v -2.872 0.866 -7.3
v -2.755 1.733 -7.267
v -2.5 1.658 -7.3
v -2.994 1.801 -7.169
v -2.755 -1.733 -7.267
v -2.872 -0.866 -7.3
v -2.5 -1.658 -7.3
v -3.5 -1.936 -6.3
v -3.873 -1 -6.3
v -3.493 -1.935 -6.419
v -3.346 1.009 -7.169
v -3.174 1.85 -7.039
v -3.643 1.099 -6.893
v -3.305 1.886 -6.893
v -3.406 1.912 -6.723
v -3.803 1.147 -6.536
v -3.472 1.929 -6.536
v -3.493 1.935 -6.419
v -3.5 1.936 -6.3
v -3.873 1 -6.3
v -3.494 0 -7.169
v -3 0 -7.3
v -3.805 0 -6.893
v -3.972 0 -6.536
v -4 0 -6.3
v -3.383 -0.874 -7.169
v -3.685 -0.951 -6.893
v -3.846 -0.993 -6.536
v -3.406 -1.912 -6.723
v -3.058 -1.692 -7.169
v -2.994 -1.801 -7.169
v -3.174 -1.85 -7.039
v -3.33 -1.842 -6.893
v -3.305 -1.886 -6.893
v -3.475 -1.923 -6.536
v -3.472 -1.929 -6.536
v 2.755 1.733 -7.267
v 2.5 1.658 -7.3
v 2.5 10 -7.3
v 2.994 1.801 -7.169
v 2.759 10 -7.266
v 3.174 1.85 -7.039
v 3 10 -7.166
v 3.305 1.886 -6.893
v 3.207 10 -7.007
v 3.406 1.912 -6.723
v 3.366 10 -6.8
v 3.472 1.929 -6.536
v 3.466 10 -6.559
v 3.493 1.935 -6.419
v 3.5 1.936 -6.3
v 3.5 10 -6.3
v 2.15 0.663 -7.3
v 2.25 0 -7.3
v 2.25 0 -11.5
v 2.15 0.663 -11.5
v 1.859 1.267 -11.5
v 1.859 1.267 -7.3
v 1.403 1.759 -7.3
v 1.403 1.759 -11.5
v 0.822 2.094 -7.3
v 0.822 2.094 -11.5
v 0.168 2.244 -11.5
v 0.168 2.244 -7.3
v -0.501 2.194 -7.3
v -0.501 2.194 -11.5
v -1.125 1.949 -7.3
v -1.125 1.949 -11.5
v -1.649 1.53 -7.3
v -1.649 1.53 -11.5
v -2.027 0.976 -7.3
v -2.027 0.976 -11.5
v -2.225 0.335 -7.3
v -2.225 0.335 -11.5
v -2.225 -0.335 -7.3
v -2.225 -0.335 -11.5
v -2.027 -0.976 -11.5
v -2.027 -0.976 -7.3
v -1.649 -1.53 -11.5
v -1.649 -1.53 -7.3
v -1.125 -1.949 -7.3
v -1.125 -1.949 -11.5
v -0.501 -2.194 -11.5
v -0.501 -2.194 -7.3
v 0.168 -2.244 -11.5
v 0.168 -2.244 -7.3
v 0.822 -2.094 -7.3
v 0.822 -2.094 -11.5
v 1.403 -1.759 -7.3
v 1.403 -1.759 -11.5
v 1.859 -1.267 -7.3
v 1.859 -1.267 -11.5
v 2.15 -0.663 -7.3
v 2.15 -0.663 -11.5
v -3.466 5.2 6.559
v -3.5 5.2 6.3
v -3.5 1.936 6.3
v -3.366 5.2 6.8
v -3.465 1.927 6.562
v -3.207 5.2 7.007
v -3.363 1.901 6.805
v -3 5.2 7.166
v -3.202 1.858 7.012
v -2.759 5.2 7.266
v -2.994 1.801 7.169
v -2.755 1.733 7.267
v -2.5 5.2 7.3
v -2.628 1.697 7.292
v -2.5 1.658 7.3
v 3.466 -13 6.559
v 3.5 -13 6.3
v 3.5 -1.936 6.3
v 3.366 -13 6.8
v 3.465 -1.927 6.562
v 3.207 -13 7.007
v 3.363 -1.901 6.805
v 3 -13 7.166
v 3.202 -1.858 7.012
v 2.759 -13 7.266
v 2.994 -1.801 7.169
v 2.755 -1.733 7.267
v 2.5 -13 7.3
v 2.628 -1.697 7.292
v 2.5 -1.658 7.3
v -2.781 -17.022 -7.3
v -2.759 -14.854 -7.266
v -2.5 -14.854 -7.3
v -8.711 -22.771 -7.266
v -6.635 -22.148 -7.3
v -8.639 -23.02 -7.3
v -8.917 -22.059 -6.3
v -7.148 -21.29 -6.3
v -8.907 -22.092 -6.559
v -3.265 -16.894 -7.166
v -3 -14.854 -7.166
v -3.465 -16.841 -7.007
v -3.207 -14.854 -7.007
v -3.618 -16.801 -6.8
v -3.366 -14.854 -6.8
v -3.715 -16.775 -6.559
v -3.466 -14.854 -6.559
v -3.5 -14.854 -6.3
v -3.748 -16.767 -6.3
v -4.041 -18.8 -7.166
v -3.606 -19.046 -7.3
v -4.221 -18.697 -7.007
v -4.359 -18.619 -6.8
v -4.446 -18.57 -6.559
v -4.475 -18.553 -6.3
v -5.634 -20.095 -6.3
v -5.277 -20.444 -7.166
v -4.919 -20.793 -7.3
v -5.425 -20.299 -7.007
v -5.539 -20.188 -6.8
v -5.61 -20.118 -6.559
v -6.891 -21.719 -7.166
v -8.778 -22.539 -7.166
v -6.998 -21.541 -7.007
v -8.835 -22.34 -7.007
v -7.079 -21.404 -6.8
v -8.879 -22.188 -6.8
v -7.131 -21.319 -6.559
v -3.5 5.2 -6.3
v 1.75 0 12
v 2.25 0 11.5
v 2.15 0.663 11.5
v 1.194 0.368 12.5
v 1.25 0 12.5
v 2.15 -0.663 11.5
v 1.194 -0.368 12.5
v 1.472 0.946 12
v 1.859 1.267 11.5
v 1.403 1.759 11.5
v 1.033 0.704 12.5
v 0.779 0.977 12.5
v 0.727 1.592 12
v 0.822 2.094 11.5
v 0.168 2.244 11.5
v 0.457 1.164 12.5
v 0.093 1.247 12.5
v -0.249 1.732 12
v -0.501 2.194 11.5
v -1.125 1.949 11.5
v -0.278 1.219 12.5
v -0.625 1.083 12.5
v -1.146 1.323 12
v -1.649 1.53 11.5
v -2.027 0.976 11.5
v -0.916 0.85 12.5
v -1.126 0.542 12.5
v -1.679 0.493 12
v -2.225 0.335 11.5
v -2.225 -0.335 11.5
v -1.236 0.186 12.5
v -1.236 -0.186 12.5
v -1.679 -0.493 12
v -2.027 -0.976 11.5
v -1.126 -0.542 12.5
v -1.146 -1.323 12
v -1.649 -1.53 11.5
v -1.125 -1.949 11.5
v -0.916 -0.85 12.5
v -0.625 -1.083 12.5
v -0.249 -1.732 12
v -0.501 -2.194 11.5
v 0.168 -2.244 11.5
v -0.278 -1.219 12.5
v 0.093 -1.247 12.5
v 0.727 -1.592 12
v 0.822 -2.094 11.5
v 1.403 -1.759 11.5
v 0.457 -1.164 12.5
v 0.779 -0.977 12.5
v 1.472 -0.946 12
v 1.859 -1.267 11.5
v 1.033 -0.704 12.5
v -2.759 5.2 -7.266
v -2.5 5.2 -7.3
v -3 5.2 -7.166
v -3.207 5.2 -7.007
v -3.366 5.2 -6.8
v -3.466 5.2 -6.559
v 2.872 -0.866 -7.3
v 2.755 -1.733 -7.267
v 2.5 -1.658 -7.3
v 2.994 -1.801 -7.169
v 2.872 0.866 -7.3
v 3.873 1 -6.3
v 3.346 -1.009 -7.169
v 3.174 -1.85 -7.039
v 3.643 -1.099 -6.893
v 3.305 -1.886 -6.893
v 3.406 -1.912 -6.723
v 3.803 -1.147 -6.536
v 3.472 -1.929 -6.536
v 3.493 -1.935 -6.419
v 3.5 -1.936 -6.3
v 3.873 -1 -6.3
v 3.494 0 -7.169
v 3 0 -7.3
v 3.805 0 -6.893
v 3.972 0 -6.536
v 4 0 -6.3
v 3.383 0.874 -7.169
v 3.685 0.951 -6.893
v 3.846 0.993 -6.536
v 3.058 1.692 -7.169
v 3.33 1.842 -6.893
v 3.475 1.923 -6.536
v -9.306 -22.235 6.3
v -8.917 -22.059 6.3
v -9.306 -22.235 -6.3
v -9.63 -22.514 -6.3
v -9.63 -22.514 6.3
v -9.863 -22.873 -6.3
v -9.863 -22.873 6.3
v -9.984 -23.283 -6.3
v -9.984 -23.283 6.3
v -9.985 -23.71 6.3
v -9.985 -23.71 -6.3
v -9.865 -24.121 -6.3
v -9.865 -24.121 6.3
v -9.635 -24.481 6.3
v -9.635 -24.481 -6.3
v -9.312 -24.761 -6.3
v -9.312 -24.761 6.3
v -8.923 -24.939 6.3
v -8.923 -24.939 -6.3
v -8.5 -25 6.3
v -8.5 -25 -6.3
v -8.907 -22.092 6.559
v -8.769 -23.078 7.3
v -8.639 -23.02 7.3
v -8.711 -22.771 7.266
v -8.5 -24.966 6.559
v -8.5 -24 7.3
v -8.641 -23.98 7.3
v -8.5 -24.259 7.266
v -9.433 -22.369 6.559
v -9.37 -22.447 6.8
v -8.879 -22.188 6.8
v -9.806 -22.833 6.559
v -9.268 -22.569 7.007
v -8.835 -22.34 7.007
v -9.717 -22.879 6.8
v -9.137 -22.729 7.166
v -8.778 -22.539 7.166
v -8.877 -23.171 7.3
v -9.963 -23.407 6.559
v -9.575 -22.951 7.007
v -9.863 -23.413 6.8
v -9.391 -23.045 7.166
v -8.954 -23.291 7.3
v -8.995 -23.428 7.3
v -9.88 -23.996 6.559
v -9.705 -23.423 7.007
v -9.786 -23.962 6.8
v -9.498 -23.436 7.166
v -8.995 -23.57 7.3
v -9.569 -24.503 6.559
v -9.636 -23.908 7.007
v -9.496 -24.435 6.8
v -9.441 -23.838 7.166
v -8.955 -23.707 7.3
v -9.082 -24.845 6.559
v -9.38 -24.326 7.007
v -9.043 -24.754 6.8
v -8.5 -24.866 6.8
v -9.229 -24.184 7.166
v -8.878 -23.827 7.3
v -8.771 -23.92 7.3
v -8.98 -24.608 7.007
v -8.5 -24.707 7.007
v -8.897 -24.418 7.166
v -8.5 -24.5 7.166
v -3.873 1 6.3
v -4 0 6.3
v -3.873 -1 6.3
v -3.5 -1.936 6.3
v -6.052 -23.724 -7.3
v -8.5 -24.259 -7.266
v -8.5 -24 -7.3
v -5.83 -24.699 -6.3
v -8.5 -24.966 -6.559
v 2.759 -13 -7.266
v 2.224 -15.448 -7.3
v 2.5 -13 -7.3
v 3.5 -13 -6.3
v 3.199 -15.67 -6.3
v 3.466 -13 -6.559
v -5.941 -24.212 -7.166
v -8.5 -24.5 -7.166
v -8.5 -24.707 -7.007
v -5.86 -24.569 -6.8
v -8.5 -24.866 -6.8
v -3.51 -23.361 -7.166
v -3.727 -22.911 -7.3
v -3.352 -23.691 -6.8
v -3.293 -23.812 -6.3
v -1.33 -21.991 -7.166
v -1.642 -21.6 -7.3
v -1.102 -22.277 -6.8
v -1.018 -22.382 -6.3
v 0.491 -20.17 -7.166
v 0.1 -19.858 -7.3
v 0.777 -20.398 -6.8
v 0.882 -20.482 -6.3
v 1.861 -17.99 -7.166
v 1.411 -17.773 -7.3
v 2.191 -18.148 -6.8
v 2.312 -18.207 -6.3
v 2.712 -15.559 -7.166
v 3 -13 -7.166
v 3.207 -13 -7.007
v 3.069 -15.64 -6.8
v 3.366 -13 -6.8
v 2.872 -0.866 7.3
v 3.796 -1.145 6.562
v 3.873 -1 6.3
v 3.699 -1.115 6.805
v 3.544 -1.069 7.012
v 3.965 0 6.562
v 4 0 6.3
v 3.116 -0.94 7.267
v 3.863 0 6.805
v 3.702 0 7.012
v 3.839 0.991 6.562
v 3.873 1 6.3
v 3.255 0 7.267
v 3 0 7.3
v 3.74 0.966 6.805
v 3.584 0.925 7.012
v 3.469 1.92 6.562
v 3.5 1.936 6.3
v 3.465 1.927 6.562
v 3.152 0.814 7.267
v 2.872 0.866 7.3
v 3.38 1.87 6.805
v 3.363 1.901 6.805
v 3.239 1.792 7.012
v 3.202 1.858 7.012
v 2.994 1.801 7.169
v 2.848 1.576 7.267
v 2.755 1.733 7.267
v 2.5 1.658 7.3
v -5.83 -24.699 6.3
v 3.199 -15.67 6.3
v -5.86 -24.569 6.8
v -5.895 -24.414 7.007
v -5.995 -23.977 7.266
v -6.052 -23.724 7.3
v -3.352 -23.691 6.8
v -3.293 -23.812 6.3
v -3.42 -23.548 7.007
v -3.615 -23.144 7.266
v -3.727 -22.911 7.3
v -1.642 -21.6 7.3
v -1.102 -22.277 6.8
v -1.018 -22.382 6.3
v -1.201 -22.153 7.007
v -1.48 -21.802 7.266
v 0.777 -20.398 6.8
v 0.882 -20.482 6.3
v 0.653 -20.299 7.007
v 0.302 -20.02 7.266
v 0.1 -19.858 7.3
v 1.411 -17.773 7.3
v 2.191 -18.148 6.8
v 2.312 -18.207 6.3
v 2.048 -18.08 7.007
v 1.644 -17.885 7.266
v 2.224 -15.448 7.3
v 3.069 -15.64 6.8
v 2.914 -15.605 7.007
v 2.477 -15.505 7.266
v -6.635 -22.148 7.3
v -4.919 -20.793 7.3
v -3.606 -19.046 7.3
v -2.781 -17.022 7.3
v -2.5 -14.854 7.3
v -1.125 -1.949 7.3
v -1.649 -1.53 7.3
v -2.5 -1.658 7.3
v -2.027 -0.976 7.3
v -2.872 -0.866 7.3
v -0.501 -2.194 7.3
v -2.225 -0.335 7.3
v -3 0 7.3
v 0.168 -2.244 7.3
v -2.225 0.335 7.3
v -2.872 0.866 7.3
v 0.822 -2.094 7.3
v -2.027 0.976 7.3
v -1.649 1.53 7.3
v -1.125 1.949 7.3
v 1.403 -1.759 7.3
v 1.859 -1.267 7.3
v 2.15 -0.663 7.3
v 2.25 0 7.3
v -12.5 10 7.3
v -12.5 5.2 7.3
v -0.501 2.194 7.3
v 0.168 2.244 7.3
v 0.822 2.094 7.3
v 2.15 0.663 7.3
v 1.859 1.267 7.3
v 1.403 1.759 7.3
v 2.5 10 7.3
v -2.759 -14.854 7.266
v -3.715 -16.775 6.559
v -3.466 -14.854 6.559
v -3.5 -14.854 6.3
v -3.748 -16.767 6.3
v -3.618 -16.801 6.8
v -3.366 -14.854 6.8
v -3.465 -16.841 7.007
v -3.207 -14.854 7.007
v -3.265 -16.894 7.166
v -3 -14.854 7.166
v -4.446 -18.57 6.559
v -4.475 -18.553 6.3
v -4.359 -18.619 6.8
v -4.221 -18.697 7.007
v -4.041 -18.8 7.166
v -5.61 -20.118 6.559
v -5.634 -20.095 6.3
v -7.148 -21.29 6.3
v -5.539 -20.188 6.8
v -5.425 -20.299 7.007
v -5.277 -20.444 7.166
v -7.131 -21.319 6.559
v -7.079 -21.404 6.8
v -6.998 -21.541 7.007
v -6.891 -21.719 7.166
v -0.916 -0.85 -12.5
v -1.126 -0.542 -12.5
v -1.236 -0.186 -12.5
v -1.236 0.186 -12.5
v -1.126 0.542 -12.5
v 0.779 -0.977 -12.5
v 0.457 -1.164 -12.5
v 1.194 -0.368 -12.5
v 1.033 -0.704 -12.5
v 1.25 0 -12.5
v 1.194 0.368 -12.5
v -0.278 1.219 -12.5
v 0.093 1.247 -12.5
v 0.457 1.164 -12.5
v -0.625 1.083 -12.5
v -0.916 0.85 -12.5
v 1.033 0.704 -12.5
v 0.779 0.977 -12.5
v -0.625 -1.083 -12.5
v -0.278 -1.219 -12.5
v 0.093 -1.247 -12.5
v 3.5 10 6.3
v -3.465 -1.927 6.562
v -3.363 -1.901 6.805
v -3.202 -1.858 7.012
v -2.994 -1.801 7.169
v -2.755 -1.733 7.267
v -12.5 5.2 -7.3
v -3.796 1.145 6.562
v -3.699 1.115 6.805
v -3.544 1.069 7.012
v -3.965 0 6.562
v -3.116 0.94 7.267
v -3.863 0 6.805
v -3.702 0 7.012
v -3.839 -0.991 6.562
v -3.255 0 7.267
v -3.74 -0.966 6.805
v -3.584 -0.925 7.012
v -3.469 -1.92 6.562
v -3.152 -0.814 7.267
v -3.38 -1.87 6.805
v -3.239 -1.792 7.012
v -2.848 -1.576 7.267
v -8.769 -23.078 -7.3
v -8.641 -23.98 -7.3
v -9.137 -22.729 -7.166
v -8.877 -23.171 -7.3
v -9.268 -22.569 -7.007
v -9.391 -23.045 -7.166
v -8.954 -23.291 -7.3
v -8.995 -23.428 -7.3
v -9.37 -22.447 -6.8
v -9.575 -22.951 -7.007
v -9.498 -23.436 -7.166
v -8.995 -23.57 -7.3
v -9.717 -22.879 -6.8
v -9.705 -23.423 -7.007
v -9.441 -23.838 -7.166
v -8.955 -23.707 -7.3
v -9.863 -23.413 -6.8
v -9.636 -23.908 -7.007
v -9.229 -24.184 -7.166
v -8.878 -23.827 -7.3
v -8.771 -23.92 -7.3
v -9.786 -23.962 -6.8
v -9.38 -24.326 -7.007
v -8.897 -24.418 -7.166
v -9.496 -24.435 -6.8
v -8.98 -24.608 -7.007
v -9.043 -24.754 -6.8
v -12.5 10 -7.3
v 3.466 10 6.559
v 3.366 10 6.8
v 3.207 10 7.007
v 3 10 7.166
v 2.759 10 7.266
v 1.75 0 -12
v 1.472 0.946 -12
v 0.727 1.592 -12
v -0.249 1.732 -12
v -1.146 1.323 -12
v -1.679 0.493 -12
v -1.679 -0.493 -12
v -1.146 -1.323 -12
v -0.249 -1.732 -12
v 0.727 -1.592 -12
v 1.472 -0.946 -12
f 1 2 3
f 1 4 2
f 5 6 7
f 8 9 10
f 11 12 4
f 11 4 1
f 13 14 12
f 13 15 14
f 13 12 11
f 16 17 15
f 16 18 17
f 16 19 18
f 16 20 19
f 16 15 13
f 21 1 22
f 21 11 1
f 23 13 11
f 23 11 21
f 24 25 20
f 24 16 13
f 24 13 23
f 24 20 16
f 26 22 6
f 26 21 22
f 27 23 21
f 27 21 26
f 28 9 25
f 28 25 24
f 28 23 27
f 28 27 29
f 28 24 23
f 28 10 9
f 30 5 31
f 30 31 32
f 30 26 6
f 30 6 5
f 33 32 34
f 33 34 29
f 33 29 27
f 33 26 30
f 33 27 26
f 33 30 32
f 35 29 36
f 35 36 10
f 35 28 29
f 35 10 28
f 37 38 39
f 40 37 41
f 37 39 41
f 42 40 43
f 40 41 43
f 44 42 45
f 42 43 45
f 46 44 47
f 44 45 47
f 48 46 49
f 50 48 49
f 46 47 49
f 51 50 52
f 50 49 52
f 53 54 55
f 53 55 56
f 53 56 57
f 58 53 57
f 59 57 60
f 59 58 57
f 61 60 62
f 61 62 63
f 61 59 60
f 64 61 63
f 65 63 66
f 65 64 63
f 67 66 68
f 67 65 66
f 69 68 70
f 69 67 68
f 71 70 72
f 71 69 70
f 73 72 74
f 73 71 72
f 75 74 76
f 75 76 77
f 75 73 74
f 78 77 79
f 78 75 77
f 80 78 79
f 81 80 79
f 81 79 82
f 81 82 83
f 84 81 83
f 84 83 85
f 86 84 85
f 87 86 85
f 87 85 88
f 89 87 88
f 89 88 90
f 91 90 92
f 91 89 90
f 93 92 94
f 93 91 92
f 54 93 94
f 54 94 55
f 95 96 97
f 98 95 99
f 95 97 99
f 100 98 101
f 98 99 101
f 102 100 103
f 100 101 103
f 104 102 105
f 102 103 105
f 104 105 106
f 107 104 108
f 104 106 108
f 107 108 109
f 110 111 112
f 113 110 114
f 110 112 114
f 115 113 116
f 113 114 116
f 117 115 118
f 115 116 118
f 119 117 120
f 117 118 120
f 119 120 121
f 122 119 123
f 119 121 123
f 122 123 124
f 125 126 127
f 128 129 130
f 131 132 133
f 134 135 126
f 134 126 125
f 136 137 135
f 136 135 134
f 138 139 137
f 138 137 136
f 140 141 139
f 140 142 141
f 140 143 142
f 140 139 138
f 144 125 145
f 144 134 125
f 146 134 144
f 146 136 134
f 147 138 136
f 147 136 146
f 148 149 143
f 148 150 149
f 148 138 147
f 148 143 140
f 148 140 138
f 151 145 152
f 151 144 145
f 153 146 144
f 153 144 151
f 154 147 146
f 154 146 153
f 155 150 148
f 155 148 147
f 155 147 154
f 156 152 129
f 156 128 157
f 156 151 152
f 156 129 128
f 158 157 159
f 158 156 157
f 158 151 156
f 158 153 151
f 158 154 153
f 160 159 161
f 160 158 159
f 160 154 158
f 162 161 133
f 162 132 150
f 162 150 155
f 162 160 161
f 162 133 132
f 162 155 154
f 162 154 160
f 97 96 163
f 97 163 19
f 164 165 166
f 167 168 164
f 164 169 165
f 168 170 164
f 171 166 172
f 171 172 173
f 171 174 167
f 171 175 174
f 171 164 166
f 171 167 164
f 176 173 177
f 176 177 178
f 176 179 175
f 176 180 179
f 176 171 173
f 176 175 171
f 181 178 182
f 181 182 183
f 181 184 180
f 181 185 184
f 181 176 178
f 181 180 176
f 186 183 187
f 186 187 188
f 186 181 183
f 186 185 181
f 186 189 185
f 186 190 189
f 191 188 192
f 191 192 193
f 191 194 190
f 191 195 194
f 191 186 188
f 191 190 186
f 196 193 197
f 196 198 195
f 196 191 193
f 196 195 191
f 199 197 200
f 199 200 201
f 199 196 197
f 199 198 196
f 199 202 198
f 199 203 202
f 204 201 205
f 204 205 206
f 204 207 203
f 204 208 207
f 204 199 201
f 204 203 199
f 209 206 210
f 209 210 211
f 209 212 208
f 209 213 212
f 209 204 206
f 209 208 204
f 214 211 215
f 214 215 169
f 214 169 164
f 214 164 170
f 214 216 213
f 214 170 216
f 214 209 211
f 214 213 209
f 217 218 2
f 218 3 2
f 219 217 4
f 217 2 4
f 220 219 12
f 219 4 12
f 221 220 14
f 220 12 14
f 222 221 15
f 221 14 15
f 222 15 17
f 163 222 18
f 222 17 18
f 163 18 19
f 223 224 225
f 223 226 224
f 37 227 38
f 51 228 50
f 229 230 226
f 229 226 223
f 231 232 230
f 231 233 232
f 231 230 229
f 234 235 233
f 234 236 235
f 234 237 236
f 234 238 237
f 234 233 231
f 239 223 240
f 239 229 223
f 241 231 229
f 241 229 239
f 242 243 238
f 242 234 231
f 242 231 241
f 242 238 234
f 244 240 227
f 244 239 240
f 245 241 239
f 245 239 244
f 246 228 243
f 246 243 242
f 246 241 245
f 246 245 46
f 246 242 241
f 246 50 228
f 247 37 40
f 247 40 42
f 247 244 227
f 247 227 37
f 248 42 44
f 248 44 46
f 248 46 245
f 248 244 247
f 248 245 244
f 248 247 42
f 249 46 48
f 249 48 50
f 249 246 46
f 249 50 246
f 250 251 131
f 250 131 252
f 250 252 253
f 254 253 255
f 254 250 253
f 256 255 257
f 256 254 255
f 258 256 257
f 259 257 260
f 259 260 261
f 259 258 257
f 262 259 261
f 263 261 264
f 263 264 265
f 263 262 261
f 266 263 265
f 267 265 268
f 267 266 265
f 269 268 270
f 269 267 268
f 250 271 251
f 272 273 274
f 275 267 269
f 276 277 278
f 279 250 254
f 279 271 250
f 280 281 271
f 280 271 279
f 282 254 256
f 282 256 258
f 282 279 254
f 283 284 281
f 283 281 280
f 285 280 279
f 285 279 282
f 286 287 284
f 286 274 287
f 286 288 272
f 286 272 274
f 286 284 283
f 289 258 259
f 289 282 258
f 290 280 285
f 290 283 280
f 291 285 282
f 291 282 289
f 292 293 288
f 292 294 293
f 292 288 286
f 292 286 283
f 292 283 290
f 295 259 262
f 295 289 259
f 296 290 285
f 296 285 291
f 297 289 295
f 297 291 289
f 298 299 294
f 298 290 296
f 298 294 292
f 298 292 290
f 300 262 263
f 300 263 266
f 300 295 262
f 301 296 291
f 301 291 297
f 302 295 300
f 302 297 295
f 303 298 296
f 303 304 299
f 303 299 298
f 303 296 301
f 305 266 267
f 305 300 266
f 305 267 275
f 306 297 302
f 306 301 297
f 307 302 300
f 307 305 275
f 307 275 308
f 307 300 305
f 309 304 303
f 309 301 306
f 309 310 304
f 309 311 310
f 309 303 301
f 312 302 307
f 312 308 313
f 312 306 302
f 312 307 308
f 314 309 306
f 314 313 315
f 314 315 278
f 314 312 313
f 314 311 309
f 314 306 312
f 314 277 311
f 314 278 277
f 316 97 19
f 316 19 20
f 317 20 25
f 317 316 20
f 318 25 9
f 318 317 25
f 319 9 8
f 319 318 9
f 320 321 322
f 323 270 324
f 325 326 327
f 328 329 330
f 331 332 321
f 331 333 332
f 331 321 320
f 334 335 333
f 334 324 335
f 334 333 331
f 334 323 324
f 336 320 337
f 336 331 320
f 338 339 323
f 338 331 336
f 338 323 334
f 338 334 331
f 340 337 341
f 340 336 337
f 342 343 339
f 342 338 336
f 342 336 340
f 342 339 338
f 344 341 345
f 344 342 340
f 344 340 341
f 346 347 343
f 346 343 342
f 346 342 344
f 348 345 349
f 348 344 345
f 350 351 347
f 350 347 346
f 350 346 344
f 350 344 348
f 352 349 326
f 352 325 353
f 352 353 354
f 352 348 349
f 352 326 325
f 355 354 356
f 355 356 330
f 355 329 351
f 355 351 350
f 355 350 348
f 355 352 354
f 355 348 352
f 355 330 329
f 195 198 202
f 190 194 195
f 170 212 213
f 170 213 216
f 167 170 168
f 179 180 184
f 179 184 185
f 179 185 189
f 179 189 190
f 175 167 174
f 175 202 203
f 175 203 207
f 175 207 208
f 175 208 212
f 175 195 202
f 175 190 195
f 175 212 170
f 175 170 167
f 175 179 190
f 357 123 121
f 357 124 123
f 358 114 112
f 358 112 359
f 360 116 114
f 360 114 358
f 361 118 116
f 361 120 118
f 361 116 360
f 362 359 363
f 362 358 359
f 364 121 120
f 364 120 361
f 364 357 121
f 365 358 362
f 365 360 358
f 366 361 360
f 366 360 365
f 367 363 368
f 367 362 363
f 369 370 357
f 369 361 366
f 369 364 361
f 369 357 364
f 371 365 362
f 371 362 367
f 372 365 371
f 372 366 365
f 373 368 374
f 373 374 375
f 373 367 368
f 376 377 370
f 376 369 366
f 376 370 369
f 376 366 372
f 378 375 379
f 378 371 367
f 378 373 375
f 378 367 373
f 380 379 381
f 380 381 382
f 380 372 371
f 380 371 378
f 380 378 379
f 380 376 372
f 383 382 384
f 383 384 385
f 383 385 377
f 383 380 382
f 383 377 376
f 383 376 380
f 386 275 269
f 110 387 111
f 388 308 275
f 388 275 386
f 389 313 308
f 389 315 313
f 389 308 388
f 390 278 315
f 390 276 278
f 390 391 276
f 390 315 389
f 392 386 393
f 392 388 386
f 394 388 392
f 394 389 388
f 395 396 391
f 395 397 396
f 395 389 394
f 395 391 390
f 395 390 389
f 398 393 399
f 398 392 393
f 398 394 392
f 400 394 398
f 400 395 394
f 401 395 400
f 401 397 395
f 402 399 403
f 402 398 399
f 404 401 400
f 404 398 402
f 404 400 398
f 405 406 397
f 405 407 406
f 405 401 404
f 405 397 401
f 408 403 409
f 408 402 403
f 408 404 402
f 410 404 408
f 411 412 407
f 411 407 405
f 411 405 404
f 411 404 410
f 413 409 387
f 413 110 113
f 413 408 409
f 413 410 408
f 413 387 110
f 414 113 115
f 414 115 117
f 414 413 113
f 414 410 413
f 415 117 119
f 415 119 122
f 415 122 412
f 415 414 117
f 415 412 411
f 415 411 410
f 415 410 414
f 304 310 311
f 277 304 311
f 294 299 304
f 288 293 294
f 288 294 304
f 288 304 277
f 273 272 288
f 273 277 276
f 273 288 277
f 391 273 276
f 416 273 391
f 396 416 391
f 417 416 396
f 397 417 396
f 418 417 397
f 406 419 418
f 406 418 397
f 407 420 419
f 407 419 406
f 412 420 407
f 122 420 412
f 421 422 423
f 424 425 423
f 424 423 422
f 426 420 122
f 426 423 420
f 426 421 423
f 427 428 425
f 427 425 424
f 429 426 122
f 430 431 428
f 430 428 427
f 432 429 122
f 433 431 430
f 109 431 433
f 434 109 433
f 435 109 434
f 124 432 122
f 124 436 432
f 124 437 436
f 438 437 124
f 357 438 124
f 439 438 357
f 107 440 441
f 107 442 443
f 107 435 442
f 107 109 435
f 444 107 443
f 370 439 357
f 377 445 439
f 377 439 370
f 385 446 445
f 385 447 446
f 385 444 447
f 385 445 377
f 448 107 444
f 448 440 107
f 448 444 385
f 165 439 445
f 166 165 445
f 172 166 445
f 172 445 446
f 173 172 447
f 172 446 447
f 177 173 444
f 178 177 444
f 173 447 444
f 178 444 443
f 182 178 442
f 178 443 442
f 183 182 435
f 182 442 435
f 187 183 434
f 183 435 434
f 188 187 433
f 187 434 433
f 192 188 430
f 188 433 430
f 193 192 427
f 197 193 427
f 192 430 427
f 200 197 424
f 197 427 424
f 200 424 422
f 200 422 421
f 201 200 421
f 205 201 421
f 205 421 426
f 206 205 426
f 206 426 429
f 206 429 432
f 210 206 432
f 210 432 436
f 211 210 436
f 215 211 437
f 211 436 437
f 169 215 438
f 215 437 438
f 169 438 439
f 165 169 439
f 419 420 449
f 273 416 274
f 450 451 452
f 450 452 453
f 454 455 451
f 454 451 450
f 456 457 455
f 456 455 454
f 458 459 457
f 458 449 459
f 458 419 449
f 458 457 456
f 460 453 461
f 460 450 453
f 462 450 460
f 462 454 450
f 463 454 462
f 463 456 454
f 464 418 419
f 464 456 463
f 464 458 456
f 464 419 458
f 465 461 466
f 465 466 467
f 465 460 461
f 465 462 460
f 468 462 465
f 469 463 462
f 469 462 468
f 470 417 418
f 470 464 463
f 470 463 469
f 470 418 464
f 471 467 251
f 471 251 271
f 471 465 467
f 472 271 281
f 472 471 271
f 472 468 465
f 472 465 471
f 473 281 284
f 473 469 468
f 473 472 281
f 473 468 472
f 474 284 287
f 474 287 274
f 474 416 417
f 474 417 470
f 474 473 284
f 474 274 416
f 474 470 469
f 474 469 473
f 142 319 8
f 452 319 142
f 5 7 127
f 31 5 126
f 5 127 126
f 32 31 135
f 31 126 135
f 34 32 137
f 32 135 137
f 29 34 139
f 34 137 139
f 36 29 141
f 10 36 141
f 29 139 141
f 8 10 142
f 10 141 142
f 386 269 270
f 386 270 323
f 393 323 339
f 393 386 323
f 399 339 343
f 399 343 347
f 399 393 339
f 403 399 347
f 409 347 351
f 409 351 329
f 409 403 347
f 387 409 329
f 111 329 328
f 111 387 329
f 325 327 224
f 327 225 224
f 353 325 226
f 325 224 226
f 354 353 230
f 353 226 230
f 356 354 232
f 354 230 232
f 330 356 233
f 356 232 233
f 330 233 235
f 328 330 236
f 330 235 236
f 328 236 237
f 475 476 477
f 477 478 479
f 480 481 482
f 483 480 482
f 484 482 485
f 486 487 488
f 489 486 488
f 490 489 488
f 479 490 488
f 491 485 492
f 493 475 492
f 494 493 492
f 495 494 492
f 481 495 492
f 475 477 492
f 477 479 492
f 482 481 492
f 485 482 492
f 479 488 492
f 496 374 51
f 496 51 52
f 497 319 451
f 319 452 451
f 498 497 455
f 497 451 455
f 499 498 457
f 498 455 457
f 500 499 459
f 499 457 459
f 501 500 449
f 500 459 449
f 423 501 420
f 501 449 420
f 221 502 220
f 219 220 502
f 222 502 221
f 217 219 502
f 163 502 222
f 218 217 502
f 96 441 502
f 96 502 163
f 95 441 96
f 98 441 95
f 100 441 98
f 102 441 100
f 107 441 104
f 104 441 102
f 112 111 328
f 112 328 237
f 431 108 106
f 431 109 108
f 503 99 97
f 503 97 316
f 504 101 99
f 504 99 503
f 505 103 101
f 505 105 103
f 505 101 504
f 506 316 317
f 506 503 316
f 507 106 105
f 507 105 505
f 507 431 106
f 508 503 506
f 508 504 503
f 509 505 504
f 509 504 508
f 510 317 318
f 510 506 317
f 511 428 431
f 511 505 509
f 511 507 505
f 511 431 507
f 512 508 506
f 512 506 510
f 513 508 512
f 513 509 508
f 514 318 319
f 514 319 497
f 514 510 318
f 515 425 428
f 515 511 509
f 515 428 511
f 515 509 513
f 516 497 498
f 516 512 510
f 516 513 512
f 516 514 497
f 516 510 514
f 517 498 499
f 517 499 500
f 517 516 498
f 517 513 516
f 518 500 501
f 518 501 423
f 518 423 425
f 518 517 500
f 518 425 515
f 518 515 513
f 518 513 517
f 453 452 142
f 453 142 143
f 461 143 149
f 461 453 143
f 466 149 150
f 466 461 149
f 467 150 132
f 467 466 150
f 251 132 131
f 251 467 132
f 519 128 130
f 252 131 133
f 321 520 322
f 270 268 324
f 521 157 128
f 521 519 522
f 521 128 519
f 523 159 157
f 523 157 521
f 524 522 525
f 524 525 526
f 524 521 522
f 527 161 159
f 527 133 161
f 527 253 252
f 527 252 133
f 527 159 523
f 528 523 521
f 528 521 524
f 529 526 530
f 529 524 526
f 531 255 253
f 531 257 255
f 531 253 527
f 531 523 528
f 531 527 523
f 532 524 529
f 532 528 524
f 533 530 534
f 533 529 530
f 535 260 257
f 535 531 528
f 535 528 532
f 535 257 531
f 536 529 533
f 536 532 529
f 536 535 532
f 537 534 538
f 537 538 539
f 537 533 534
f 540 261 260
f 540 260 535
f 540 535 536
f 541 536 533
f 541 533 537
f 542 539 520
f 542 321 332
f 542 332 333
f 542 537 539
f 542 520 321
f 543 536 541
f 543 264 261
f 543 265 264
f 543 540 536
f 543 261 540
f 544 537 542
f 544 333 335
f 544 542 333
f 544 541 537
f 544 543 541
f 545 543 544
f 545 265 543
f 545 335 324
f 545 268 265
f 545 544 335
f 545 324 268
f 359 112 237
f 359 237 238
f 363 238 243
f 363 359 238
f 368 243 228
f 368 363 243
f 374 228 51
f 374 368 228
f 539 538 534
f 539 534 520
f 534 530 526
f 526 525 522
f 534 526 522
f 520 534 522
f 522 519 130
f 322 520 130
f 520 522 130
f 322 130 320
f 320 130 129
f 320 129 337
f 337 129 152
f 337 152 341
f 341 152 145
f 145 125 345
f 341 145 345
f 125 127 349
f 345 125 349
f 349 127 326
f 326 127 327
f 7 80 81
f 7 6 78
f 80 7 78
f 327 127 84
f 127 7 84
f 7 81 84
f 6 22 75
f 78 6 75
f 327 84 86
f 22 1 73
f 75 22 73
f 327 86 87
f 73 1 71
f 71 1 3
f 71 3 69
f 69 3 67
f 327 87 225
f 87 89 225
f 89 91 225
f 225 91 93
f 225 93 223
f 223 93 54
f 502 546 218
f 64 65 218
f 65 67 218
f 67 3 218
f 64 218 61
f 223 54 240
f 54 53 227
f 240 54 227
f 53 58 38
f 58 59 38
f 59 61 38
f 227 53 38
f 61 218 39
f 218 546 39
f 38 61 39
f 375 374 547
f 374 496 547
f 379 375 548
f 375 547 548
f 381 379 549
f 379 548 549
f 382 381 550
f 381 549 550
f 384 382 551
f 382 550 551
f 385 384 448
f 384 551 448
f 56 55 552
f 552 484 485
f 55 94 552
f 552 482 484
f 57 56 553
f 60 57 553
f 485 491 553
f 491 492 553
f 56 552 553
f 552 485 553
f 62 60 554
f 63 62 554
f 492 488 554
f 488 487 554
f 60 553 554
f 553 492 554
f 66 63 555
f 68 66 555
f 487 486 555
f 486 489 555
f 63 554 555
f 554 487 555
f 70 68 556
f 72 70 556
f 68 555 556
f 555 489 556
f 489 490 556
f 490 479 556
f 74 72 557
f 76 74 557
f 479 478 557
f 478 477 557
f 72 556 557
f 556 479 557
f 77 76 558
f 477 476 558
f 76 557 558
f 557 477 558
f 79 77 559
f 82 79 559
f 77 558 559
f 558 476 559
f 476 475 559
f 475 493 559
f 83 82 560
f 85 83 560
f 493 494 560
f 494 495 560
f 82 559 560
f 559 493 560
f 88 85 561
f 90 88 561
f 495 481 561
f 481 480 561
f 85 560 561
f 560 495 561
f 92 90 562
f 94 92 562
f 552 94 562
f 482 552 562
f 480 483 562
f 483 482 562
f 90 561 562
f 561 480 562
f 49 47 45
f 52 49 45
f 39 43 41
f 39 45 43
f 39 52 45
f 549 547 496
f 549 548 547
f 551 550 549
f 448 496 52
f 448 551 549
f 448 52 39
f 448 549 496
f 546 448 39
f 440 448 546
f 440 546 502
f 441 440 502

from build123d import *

# Parameters (mm, degrees)
BOSS_EXTRU_1_DEPTH = 7.3
ESQUISSE2_R        = 2.25
BOSS_EXTRU_2_DEPTH = 5.2
CHANFREIN1_SIZE    = 1
CHANFREIN2_SIZE    = 1
CONG_1_R           = 1


with BuildPart() as part:
    # Esquisse1 → Boss.-Extru.1 (new body, symmetric)
    with BuildSketch(Plane.XY):
        with BuildLine():
            Line((-3.5, -1.936491673), (-3.5, -14.854191767))
            ThreePointArc((-3.5, -14.854191767), (-5.005210596, -19.361130861), (-8.916666667, -22.059031961))
            ThreePointArc((-8.916666667, -22.059031961), (-9.985168687, -23.710413809), (-8.5, -25))
            ThreePointArc((-8.5, -25), (-0.014718626, -21.485281374), (3.5, -13))
            Line((3.5, -13), (3.5, -1.936491673))
            ThreePointArc((3.5, -1.936491673), (4, 0), (3.5, 1.936491673))
            Line((3.5, 1.936491673), (3.5, 10))
            Line((3.5, 10), (-3.5, 10))
            Line((-3.5, 10), (-12.5, 10))
            Line((-12.5, 10), (-12.5, 5.2))
            Line((-12.5, 5.2), (-3.5, 5.2))
            Line((-3.5, 5.2), (-3.5, 1.936491673))
            ThreePointArc((-3.5, 1.936491673), (-4, 0), (-3.5, -1.936491673))
        make_face()
    extrude(amount=BOSS_EXTRU_1_DEPTH, both=True)

    # Esquisse2 → Boss.-Extru.2 (add)
    with BuildSketch(Plane.XY.offset(7.3)):
        Circle(ESQUISSE2_R)
    boss_extru_2 = extrude(amount=BOSS_EXTRU_2_DEPTH)

    # Chanfrein1
    chanfrein1_edges = [part.edges().sort_by_distance(p)[0] for p in [
        (-2.25, 0, 12.5),
    ]]
    chamfer(chanfrein1_edges, length=CHANFREIN1_SIZE)

    # Symétrie1: Boss.-Extru.2 across plane
    add(boss_extru_2.mirror(Plane.XY))

    # Chanfrein2
    chanfrein2_edges = [part.edges().sort_by_distance(p)[0] for p in [
        (-2.25, 0, -12.5),
    ]]
    chamfer(chanfrein2_edges, length=CHANFREIN2_SIZE)

    # Congé1
    cong_1_edges = [part.edges().sort_by_distance(p)[0] for p in [
        (3.5, -7.468245837, 7.3),
        (-5.005210596, -19.361130861, -7.3),
        (-3.5, -8.39534172, -7.3),
        (-4, 0, -7.3),
        (-3.5, 3.568245837, -7.3),
        (3.5, 5.968245837, -7.3),
        (4, 0, -7.3),
        (4, 0, 7.3),
        (3.5, -7.468245837, -7.3),
        (-0.014718626, -21.485281374, -7.3),
        (-9.985168687, -23.710413809, -7.3),
        (3.5, 5.968245837, 7.3),
        (-3.5, 3.568245837, 7.3),
        (-4, 0, 7.3),
        (-3.5, -8.39534172, 7.3),
        (-9.985168687, -23.710413809, 7.3),
        (-5.005210596, -19.361130861, 7.3),
        (-0.014718626, -21.485281374, 7.3),
    ]]
    fillet(cong_1_edges, radius=CONG_1_R)


solid = part.part
